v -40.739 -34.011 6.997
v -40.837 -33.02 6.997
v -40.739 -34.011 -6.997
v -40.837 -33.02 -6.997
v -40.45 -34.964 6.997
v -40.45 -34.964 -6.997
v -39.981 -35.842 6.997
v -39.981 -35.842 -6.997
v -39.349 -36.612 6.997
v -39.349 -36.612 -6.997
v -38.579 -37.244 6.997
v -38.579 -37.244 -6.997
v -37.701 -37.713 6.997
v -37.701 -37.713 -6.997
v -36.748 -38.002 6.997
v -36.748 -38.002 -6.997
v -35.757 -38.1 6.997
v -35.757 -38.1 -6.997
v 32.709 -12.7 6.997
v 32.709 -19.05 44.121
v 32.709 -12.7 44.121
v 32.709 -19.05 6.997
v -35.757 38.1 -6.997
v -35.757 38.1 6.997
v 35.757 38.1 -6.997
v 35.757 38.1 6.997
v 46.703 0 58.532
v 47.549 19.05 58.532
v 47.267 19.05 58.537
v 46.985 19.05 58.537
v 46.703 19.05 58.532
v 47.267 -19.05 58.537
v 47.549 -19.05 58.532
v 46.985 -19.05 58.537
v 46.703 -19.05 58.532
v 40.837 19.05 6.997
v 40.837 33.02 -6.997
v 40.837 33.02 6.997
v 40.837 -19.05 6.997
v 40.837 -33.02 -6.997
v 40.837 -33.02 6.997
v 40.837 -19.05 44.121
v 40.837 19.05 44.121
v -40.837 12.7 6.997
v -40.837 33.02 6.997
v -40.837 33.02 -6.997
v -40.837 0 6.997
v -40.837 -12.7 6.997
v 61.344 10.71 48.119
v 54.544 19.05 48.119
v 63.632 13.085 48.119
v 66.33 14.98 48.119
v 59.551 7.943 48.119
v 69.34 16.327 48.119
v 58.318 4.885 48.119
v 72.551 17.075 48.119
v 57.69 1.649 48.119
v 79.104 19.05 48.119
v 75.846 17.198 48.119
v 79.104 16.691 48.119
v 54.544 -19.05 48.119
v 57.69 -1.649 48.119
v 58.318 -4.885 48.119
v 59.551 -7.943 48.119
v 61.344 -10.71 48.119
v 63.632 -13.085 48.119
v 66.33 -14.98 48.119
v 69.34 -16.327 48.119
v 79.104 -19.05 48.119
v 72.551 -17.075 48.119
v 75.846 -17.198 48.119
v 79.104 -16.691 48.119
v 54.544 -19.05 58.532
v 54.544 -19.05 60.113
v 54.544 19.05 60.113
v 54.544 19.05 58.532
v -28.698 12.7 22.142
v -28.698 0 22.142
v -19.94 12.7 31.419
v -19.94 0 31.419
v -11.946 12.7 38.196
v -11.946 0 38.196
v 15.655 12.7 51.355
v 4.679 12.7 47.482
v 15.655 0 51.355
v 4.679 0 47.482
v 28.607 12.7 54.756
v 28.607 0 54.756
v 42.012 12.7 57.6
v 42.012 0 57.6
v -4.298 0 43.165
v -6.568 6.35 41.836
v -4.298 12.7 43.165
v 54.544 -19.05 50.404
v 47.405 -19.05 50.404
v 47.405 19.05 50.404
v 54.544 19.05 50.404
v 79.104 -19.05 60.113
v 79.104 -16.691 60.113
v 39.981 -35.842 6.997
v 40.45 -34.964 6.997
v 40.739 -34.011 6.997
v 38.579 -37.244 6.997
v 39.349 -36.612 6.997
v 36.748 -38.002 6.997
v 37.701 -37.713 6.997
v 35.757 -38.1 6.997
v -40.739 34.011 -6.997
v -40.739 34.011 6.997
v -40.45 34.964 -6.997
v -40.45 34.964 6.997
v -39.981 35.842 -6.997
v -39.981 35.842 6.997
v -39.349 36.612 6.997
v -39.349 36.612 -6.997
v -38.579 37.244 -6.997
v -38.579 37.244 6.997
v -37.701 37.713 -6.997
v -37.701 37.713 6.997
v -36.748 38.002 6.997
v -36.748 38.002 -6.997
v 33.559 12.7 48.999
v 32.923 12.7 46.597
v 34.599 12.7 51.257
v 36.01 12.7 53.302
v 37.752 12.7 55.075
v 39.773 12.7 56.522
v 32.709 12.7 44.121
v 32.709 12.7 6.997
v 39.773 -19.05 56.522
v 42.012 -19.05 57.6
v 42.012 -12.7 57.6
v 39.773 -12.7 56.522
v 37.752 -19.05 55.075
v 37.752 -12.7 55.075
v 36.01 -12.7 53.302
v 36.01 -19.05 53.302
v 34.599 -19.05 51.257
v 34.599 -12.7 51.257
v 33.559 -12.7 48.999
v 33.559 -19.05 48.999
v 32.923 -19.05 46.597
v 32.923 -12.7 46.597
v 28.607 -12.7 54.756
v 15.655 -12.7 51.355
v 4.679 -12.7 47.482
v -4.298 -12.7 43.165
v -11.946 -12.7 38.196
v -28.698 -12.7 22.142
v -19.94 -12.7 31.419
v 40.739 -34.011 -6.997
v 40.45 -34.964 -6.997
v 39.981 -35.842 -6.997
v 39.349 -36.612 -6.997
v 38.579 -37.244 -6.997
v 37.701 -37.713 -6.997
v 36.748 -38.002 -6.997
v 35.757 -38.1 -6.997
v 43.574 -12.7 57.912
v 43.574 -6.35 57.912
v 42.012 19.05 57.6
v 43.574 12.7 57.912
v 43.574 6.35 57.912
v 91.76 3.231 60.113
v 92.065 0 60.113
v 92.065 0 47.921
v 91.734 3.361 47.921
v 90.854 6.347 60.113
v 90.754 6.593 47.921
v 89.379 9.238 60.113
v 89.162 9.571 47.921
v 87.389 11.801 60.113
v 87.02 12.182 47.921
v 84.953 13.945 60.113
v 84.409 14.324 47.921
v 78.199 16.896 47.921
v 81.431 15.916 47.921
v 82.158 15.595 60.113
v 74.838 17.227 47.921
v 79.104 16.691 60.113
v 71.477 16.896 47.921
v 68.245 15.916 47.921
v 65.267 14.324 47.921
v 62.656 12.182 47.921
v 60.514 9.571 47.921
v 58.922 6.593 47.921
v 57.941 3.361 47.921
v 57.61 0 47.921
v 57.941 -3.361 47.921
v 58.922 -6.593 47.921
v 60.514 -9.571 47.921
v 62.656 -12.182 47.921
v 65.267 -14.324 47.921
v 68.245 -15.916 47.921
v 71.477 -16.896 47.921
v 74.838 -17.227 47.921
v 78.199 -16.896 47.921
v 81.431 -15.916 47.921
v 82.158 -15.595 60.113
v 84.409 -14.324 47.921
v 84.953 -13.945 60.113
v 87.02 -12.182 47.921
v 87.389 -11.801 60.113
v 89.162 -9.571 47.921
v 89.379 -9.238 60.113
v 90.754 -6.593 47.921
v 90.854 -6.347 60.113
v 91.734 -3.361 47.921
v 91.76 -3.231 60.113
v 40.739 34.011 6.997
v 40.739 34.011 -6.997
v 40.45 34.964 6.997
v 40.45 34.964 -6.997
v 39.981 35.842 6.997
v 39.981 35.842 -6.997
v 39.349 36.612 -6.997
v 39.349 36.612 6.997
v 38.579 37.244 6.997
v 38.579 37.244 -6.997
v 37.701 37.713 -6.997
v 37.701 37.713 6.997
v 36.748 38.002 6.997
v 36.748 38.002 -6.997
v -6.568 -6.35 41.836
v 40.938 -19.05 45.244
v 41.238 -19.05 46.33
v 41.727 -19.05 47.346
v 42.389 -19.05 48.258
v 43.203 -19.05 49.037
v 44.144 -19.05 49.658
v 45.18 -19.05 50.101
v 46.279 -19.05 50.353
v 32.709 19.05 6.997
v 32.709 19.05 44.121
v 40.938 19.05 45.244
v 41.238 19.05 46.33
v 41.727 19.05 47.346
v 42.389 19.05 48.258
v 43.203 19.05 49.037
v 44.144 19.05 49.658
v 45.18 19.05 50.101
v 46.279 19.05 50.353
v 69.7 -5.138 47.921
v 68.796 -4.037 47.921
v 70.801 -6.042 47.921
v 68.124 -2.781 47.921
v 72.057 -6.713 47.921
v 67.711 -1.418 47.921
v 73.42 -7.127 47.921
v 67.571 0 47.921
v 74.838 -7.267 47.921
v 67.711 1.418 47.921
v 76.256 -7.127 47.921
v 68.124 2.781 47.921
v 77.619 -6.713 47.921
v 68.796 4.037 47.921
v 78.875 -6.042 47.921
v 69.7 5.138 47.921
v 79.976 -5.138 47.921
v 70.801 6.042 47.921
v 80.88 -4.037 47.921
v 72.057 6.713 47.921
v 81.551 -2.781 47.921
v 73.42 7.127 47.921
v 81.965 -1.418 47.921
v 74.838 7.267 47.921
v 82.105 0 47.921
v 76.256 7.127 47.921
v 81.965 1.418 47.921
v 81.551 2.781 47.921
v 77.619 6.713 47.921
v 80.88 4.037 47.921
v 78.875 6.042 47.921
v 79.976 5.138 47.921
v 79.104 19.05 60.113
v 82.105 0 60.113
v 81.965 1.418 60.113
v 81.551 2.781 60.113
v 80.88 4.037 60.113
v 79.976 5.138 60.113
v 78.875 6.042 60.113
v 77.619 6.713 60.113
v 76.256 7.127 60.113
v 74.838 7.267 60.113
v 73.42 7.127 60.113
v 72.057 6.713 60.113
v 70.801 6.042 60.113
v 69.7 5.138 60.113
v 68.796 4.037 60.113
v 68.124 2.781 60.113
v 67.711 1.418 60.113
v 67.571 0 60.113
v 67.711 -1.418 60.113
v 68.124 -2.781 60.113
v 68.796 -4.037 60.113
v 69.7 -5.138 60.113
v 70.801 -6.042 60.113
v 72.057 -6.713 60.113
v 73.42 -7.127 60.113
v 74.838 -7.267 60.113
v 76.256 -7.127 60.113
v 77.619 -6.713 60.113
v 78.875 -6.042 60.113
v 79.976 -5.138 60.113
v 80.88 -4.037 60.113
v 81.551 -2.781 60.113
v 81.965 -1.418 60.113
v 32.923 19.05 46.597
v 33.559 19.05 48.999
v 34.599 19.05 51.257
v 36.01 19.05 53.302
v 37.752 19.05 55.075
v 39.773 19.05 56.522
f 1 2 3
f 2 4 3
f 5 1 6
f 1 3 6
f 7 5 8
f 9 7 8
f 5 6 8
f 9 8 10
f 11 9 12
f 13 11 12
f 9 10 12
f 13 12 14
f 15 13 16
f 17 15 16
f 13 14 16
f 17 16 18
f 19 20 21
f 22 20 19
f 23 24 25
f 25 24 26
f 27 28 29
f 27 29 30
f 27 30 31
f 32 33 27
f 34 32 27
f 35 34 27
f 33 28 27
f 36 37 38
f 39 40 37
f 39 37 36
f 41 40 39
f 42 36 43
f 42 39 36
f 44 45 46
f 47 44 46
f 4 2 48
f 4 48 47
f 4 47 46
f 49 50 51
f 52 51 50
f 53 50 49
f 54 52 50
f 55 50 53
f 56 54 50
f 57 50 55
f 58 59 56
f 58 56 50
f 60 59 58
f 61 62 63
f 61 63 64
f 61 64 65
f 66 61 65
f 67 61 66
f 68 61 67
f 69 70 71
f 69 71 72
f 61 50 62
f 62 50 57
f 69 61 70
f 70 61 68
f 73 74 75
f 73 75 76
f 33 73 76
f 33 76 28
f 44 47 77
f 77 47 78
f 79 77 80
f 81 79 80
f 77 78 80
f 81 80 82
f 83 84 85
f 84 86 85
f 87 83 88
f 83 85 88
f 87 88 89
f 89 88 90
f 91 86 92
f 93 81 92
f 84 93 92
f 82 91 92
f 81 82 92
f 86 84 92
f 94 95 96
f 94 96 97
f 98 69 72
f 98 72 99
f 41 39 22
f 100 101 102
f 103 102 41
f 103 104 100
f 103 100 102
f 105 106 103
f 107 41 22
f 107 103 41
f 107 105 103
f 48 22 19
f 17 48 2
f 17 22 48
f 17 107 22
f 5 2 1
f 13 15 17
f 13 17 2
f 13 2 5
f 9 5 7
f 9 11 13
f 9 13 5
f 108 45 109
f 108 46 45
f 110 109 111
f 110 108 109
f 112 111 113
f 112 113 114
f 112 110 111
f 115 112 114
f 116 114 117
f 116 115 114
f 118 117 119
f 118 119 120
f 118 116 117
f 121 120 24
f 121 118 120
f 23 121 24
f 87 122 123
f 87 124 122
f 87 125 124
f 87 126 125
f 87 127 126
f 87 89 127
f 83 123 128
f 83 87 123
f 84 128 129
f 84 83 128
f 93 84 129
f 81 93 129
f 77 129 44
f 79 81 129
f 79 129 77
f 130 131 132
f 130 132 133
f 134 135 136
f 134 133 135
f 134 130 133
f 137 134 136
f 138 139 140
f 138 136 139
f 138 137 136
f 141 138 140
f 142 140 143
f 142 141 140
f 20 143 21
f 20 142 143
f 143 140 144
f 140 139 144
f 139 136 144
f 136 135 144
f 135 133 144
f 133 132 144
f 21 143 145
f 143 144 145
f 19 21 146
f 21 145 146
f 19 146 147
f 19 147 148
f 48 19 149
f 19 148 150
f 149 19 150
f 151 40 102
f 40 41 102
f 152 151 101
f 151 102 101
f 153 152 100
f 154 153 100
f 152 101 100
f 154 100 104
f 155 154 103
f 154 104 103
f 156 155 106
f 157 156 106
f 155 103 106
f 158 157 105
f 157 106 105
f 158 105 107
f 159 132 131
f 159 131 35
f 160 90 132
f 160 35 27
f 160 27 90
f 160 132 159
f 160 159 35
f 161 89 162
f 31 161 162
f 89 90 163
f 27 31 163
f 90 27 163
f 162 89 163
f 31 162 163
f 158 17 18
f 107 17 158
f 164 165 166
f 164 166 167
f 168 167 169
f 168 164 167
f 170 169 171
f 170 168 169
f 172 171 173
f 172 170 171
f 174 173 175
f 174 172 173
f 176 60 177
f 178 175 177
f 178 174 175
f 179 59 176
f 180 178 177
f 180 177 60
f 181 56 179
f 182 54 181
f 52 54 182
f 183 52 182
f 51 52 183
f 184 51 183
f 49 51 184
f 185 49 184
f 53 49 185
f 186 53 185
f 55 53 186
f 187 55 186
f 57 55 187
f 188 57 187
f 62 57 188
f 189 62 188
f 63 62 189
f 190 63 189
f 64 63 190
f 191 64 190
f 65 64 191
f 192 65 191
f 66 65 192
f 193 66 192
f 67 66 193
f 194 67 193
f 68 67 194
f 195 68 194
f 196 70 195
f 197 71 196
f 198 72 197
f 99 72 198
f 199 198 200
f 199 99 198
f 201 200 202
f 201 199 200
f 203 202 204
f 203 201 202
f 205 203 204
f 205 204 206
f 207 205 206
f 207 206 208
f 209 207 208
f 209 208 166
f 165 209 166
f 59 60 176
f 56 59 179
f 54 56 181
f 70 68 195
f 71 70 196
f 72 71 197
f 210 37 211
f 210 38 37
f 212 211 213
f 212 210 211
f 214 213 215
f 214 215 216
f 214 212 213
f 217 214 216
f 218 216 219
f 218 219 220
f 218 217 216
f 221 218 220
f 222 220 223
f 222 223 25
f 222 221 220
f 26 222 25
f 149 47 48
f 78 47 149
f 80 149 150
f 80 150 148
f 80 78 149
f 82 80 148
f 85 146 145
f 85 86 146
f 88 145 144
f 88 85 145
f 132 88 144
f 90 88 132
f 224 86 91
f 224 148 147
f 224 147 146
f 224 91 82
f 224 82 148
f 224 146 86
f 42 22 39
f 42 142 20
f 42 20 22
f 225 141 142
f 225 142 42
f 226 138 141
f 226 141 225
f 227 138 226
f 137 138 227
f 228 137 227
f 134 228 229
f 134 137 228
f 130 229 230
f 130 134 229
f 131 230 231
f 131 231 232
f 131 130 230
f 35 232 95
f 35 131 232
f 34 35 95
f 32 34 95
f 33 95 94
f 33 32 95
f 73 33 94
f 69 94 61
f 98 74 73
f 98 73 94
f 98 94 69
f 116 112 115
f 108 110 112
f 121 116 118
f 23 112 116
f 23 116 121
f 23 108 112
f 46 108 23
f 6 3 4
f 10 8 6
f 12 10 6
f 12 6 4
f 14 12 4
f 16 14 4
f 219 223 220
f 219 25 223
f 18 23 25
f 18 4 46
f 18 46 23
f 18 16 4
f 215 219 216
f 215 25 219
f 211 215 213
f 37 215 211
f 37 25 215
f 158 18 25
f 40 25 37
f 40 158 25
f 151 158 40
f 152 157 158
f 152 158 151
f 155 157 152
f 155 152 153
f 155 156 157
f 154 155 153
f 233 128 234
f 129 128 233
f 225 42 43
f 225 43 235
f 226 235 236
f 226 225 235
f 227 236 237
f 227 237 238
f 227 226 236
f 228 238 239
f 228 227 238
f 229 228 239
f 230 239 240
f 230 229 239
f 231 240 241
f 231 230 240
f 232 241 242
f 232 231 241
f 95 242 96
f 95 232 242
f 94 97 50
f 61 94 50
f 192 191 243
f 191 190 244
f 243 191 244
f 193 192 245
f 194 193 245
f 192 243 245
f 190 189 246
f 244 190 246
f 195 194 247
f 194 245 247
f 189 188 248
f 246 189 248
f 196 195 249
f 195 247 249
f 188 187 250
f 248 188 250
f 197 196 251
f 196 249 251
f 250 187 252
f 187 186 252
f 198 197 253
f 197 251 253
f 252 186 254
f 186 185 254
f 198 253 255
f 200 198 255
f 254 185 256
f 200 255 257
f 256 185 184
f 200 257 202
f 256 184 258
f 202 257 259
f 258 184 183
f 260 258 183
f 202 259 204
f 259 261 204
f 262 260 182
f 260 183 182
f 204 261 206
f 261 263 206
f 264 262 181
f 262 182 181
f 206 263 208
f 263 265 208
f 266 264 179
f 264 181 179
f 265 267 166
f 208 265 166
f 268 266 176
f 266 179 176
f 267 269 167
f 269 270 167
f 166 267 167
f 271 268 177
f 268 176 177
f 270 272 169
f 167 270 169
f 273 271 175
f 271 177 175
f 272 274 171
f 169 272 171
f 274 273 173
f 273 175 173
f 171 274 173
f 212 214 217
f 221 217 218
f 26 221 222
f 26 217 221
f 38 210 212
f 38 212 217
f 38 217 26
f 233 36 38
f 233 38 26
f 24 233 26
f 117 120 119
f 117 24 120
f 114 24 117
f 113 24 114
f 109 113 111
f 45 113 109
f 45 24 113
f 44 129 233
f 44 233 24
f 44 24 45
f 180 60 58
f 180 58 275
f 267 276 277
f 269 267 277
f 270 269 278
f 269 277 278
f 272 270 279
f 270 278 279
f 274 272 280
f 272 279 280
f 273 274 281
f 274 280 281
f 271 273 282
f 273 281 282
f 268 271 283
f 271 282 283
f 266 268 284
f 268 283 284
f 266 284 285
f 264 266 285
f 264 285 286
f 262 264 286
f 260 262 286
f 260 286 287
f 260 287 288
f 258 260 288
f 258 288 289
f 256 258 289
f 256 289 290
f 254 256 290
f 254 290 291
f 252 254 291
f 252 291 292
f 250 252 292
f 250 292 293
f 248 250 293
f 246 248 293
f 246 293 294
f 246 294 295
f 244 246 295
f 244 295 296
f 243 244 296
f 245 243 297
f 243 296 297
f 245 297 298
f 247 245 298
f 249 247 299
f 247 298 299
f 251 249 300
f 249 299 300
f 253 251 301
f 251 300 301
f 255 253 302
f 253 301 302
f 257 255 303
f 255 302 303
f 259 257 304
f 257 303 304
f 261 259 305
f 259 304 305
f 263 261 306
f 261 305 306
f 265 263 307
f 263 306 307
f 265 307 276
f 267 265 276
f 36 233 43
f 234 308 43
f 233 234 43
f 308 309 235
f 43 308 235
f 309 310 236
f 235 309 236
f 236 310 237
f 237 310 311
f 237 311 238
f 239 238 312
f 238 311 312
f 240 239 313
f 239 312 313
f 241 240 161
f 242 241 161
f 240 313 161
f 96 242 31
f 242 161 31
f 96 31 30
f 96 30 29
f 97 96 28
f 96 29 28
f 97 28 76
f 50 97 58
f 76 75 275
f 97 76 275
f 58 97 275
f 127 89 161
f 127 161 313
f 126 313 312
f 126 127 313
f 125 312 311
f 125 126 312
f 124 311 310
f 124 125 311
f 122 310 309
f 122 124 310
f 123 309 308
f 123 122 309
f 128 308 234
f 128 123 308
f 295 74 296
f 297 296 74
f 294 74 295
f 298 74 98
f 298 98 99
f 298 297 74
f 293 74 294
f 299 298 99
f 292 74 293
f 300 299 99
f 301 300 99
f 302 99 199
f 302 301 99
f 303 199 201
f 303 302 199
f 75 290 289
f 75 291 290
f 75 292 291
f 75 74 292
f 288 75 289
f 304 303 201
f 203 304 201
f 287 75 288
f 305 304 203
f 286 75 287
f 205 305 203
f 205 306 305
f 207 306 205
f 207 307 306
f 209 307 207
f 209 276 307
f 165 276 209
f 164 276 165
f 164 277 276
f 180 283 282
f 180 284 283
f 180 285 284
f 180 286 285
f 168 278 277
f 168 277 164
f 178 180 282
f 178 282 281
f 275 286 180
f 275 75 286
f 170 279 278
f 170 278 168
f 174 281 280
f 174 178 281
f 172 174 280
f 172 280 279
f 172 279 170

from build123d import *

# Parameters (mm, degrees)
F1_DEPTH = 38.1
F2_DEPTH = 19.05
F3_DEPTH = 12.7
F5_DEPTH = 12.192
F6_R     = 5.08
F7_R     = 7.266587331
F8_DEPTH = 67.1105764264


with BuildPart() as f1:
    # F0 (on Front) → F1 (new body, symmetric)
    with BuildSketch(Plane.XZ):
        Polygon((-40.8368967474, -6.9965338334), (40.8368967474, -6.9965338334), (40.8368967474, 6.9965338334), (32.7088981867, 6.9965338334), (-40.8368967474, 6.9965338334), align=None)
    extrude(amount=F1_DEPTH, both=True)

    # F0 (on Front) → F2 (join, symmetric)
    with BuildSketch(Plane.XZ):
        with BuildLine():
            Line((32.7088981867, 6.9965338334), (40.8368967474, 6.9965338334))
            Line((40.8368967474, 6.9965338334), (40.8368967474, 44.1209748387))
            ThreePointArc((40.8368967474, 44.1209748387), (42.7787364938, 48.6655280984), (47.405064106, 50.403572619))
            Line((47.405064106, 50.403572619), (54.5443966985, 50.403572619))
            Line((54.5443966985, 50.403572619), (54.5443966985, 58.5315711796))
            Line((54.5443966985, 58.5315711796), (47.5487387444, 58.5315711796))
            ThreePointArc((47.5487387444, 58.5315711796), (47.1257024985, 58.5377791506), (46.7026662526, 58.5315711796))
            add(Edge.make_bspline(
                [(42.0115930359, 57.6002229992), (43.5737310544, 57.9125891747), (45.1381986535, 58.2220801772), (46.7026662526, 58.5315711796)],
                knots=[0.9578817781, 0.9578817781, 0.9578817781, 0.9578817781, 1, 1, 1, 1], degree=3))
            ThreePointArc((42.0115930359, 57.6002229992), (35.2603461634, 52.3098432347), (32.7088981867, 44.1209748387))
            Line((32.7088981867, 44.1209748387), (32.7088981867, 6.9965338334))
        make_face()
        Polygon((54.5443966985, 58.5315711796), (54.5443966985, 50.403572619), (54.5443966985, 48.1189936399), (79.1036263108, 48.1189936399), (79.1036263108, 60.113042593), (54.5443966985, 60.113042593), align=None)
    extrude(amount=F2_DEPTH, both=True)

    # F0 (on Front) → F3 (join, symmetric)
    with BuildSketch(Plane.XZ):
        with BuildLine():
            add(Edge.make_bspline(
                [(-40.8368967474, 6.9965338334), (-30.668528225, 20.158177618), (-10.5181051355, 46.2403057616), (24.4122257068, 54.0810415955), (42.0115930359, 57.6002229992)],
                knots=[0, 0, 0, 0, 0.4833692512, 0.9578817781, 0.9578817781, 0.9578817781, 0.9578817781], degree=3))
            Line((-40.8368967474, 6.9965338334), (32.7088981867, 6.9965338334))
            Line((32.7088981867, 6.9965338334), (32.7088981867, 44.1209748387))
            ThreePointArc((32.7088981867, 44.1209748387), (35.2603461634, 52.3098432347), (42.0115930359, 57.6002229992))
        make_face()
    extrude(amount=F3_DEPTH, both=True)

    # F4 (on face) → F5 (join)
    with BuildSketch(Plane.XY.offset(60.113042593)):
        with BuildLine():
            Line((79.1036263108, -16.6910297118), (79.1036263108, 16.6910297118))
            ThreePointArc((79.1036263108, 16.6910297118), (57.6104526514, 0), (79.1036263108, -16.6910297118))
        make_face()
        with BuildLine():
            ThreePointArc((79.1036263108, -16.6910297118), (88.4444418904, -10.5664449916), (92.0654381519, 0))
            ThreePointArc((92.0654381519, 0), (88.4444418904, 10.5664449916), (79.1036263108, 16.6910297118))
            Line((79.1036263108, 16.6910297118), (79.1036263108, -16.6910297118))
        make_face()
    extrude(amount=-F5_DEPTH)

    # F6
    f6_edges = [f1.edges().sort_by_distance(p)[0] for p in [
        (-40.836897, -38.1, 0),
        (40.836897, -38.1, 0),
        (40.836897, 38.1, 0),
        (-40.836897, 38.1, 0),
    ]]
    fillet(f6_edges, radius=F6_R)

    # F7 (on face) → F8 (cut, through all)
    with BuildSketch(Plane.XY.offset(60.113042593)):
        with Locations((74.8379454017, 0)):
            Circle(F7_R)
    extrude(amount=-F8_DEPTH, mode=Mode.SUBTRACT)


solid = f1.part
